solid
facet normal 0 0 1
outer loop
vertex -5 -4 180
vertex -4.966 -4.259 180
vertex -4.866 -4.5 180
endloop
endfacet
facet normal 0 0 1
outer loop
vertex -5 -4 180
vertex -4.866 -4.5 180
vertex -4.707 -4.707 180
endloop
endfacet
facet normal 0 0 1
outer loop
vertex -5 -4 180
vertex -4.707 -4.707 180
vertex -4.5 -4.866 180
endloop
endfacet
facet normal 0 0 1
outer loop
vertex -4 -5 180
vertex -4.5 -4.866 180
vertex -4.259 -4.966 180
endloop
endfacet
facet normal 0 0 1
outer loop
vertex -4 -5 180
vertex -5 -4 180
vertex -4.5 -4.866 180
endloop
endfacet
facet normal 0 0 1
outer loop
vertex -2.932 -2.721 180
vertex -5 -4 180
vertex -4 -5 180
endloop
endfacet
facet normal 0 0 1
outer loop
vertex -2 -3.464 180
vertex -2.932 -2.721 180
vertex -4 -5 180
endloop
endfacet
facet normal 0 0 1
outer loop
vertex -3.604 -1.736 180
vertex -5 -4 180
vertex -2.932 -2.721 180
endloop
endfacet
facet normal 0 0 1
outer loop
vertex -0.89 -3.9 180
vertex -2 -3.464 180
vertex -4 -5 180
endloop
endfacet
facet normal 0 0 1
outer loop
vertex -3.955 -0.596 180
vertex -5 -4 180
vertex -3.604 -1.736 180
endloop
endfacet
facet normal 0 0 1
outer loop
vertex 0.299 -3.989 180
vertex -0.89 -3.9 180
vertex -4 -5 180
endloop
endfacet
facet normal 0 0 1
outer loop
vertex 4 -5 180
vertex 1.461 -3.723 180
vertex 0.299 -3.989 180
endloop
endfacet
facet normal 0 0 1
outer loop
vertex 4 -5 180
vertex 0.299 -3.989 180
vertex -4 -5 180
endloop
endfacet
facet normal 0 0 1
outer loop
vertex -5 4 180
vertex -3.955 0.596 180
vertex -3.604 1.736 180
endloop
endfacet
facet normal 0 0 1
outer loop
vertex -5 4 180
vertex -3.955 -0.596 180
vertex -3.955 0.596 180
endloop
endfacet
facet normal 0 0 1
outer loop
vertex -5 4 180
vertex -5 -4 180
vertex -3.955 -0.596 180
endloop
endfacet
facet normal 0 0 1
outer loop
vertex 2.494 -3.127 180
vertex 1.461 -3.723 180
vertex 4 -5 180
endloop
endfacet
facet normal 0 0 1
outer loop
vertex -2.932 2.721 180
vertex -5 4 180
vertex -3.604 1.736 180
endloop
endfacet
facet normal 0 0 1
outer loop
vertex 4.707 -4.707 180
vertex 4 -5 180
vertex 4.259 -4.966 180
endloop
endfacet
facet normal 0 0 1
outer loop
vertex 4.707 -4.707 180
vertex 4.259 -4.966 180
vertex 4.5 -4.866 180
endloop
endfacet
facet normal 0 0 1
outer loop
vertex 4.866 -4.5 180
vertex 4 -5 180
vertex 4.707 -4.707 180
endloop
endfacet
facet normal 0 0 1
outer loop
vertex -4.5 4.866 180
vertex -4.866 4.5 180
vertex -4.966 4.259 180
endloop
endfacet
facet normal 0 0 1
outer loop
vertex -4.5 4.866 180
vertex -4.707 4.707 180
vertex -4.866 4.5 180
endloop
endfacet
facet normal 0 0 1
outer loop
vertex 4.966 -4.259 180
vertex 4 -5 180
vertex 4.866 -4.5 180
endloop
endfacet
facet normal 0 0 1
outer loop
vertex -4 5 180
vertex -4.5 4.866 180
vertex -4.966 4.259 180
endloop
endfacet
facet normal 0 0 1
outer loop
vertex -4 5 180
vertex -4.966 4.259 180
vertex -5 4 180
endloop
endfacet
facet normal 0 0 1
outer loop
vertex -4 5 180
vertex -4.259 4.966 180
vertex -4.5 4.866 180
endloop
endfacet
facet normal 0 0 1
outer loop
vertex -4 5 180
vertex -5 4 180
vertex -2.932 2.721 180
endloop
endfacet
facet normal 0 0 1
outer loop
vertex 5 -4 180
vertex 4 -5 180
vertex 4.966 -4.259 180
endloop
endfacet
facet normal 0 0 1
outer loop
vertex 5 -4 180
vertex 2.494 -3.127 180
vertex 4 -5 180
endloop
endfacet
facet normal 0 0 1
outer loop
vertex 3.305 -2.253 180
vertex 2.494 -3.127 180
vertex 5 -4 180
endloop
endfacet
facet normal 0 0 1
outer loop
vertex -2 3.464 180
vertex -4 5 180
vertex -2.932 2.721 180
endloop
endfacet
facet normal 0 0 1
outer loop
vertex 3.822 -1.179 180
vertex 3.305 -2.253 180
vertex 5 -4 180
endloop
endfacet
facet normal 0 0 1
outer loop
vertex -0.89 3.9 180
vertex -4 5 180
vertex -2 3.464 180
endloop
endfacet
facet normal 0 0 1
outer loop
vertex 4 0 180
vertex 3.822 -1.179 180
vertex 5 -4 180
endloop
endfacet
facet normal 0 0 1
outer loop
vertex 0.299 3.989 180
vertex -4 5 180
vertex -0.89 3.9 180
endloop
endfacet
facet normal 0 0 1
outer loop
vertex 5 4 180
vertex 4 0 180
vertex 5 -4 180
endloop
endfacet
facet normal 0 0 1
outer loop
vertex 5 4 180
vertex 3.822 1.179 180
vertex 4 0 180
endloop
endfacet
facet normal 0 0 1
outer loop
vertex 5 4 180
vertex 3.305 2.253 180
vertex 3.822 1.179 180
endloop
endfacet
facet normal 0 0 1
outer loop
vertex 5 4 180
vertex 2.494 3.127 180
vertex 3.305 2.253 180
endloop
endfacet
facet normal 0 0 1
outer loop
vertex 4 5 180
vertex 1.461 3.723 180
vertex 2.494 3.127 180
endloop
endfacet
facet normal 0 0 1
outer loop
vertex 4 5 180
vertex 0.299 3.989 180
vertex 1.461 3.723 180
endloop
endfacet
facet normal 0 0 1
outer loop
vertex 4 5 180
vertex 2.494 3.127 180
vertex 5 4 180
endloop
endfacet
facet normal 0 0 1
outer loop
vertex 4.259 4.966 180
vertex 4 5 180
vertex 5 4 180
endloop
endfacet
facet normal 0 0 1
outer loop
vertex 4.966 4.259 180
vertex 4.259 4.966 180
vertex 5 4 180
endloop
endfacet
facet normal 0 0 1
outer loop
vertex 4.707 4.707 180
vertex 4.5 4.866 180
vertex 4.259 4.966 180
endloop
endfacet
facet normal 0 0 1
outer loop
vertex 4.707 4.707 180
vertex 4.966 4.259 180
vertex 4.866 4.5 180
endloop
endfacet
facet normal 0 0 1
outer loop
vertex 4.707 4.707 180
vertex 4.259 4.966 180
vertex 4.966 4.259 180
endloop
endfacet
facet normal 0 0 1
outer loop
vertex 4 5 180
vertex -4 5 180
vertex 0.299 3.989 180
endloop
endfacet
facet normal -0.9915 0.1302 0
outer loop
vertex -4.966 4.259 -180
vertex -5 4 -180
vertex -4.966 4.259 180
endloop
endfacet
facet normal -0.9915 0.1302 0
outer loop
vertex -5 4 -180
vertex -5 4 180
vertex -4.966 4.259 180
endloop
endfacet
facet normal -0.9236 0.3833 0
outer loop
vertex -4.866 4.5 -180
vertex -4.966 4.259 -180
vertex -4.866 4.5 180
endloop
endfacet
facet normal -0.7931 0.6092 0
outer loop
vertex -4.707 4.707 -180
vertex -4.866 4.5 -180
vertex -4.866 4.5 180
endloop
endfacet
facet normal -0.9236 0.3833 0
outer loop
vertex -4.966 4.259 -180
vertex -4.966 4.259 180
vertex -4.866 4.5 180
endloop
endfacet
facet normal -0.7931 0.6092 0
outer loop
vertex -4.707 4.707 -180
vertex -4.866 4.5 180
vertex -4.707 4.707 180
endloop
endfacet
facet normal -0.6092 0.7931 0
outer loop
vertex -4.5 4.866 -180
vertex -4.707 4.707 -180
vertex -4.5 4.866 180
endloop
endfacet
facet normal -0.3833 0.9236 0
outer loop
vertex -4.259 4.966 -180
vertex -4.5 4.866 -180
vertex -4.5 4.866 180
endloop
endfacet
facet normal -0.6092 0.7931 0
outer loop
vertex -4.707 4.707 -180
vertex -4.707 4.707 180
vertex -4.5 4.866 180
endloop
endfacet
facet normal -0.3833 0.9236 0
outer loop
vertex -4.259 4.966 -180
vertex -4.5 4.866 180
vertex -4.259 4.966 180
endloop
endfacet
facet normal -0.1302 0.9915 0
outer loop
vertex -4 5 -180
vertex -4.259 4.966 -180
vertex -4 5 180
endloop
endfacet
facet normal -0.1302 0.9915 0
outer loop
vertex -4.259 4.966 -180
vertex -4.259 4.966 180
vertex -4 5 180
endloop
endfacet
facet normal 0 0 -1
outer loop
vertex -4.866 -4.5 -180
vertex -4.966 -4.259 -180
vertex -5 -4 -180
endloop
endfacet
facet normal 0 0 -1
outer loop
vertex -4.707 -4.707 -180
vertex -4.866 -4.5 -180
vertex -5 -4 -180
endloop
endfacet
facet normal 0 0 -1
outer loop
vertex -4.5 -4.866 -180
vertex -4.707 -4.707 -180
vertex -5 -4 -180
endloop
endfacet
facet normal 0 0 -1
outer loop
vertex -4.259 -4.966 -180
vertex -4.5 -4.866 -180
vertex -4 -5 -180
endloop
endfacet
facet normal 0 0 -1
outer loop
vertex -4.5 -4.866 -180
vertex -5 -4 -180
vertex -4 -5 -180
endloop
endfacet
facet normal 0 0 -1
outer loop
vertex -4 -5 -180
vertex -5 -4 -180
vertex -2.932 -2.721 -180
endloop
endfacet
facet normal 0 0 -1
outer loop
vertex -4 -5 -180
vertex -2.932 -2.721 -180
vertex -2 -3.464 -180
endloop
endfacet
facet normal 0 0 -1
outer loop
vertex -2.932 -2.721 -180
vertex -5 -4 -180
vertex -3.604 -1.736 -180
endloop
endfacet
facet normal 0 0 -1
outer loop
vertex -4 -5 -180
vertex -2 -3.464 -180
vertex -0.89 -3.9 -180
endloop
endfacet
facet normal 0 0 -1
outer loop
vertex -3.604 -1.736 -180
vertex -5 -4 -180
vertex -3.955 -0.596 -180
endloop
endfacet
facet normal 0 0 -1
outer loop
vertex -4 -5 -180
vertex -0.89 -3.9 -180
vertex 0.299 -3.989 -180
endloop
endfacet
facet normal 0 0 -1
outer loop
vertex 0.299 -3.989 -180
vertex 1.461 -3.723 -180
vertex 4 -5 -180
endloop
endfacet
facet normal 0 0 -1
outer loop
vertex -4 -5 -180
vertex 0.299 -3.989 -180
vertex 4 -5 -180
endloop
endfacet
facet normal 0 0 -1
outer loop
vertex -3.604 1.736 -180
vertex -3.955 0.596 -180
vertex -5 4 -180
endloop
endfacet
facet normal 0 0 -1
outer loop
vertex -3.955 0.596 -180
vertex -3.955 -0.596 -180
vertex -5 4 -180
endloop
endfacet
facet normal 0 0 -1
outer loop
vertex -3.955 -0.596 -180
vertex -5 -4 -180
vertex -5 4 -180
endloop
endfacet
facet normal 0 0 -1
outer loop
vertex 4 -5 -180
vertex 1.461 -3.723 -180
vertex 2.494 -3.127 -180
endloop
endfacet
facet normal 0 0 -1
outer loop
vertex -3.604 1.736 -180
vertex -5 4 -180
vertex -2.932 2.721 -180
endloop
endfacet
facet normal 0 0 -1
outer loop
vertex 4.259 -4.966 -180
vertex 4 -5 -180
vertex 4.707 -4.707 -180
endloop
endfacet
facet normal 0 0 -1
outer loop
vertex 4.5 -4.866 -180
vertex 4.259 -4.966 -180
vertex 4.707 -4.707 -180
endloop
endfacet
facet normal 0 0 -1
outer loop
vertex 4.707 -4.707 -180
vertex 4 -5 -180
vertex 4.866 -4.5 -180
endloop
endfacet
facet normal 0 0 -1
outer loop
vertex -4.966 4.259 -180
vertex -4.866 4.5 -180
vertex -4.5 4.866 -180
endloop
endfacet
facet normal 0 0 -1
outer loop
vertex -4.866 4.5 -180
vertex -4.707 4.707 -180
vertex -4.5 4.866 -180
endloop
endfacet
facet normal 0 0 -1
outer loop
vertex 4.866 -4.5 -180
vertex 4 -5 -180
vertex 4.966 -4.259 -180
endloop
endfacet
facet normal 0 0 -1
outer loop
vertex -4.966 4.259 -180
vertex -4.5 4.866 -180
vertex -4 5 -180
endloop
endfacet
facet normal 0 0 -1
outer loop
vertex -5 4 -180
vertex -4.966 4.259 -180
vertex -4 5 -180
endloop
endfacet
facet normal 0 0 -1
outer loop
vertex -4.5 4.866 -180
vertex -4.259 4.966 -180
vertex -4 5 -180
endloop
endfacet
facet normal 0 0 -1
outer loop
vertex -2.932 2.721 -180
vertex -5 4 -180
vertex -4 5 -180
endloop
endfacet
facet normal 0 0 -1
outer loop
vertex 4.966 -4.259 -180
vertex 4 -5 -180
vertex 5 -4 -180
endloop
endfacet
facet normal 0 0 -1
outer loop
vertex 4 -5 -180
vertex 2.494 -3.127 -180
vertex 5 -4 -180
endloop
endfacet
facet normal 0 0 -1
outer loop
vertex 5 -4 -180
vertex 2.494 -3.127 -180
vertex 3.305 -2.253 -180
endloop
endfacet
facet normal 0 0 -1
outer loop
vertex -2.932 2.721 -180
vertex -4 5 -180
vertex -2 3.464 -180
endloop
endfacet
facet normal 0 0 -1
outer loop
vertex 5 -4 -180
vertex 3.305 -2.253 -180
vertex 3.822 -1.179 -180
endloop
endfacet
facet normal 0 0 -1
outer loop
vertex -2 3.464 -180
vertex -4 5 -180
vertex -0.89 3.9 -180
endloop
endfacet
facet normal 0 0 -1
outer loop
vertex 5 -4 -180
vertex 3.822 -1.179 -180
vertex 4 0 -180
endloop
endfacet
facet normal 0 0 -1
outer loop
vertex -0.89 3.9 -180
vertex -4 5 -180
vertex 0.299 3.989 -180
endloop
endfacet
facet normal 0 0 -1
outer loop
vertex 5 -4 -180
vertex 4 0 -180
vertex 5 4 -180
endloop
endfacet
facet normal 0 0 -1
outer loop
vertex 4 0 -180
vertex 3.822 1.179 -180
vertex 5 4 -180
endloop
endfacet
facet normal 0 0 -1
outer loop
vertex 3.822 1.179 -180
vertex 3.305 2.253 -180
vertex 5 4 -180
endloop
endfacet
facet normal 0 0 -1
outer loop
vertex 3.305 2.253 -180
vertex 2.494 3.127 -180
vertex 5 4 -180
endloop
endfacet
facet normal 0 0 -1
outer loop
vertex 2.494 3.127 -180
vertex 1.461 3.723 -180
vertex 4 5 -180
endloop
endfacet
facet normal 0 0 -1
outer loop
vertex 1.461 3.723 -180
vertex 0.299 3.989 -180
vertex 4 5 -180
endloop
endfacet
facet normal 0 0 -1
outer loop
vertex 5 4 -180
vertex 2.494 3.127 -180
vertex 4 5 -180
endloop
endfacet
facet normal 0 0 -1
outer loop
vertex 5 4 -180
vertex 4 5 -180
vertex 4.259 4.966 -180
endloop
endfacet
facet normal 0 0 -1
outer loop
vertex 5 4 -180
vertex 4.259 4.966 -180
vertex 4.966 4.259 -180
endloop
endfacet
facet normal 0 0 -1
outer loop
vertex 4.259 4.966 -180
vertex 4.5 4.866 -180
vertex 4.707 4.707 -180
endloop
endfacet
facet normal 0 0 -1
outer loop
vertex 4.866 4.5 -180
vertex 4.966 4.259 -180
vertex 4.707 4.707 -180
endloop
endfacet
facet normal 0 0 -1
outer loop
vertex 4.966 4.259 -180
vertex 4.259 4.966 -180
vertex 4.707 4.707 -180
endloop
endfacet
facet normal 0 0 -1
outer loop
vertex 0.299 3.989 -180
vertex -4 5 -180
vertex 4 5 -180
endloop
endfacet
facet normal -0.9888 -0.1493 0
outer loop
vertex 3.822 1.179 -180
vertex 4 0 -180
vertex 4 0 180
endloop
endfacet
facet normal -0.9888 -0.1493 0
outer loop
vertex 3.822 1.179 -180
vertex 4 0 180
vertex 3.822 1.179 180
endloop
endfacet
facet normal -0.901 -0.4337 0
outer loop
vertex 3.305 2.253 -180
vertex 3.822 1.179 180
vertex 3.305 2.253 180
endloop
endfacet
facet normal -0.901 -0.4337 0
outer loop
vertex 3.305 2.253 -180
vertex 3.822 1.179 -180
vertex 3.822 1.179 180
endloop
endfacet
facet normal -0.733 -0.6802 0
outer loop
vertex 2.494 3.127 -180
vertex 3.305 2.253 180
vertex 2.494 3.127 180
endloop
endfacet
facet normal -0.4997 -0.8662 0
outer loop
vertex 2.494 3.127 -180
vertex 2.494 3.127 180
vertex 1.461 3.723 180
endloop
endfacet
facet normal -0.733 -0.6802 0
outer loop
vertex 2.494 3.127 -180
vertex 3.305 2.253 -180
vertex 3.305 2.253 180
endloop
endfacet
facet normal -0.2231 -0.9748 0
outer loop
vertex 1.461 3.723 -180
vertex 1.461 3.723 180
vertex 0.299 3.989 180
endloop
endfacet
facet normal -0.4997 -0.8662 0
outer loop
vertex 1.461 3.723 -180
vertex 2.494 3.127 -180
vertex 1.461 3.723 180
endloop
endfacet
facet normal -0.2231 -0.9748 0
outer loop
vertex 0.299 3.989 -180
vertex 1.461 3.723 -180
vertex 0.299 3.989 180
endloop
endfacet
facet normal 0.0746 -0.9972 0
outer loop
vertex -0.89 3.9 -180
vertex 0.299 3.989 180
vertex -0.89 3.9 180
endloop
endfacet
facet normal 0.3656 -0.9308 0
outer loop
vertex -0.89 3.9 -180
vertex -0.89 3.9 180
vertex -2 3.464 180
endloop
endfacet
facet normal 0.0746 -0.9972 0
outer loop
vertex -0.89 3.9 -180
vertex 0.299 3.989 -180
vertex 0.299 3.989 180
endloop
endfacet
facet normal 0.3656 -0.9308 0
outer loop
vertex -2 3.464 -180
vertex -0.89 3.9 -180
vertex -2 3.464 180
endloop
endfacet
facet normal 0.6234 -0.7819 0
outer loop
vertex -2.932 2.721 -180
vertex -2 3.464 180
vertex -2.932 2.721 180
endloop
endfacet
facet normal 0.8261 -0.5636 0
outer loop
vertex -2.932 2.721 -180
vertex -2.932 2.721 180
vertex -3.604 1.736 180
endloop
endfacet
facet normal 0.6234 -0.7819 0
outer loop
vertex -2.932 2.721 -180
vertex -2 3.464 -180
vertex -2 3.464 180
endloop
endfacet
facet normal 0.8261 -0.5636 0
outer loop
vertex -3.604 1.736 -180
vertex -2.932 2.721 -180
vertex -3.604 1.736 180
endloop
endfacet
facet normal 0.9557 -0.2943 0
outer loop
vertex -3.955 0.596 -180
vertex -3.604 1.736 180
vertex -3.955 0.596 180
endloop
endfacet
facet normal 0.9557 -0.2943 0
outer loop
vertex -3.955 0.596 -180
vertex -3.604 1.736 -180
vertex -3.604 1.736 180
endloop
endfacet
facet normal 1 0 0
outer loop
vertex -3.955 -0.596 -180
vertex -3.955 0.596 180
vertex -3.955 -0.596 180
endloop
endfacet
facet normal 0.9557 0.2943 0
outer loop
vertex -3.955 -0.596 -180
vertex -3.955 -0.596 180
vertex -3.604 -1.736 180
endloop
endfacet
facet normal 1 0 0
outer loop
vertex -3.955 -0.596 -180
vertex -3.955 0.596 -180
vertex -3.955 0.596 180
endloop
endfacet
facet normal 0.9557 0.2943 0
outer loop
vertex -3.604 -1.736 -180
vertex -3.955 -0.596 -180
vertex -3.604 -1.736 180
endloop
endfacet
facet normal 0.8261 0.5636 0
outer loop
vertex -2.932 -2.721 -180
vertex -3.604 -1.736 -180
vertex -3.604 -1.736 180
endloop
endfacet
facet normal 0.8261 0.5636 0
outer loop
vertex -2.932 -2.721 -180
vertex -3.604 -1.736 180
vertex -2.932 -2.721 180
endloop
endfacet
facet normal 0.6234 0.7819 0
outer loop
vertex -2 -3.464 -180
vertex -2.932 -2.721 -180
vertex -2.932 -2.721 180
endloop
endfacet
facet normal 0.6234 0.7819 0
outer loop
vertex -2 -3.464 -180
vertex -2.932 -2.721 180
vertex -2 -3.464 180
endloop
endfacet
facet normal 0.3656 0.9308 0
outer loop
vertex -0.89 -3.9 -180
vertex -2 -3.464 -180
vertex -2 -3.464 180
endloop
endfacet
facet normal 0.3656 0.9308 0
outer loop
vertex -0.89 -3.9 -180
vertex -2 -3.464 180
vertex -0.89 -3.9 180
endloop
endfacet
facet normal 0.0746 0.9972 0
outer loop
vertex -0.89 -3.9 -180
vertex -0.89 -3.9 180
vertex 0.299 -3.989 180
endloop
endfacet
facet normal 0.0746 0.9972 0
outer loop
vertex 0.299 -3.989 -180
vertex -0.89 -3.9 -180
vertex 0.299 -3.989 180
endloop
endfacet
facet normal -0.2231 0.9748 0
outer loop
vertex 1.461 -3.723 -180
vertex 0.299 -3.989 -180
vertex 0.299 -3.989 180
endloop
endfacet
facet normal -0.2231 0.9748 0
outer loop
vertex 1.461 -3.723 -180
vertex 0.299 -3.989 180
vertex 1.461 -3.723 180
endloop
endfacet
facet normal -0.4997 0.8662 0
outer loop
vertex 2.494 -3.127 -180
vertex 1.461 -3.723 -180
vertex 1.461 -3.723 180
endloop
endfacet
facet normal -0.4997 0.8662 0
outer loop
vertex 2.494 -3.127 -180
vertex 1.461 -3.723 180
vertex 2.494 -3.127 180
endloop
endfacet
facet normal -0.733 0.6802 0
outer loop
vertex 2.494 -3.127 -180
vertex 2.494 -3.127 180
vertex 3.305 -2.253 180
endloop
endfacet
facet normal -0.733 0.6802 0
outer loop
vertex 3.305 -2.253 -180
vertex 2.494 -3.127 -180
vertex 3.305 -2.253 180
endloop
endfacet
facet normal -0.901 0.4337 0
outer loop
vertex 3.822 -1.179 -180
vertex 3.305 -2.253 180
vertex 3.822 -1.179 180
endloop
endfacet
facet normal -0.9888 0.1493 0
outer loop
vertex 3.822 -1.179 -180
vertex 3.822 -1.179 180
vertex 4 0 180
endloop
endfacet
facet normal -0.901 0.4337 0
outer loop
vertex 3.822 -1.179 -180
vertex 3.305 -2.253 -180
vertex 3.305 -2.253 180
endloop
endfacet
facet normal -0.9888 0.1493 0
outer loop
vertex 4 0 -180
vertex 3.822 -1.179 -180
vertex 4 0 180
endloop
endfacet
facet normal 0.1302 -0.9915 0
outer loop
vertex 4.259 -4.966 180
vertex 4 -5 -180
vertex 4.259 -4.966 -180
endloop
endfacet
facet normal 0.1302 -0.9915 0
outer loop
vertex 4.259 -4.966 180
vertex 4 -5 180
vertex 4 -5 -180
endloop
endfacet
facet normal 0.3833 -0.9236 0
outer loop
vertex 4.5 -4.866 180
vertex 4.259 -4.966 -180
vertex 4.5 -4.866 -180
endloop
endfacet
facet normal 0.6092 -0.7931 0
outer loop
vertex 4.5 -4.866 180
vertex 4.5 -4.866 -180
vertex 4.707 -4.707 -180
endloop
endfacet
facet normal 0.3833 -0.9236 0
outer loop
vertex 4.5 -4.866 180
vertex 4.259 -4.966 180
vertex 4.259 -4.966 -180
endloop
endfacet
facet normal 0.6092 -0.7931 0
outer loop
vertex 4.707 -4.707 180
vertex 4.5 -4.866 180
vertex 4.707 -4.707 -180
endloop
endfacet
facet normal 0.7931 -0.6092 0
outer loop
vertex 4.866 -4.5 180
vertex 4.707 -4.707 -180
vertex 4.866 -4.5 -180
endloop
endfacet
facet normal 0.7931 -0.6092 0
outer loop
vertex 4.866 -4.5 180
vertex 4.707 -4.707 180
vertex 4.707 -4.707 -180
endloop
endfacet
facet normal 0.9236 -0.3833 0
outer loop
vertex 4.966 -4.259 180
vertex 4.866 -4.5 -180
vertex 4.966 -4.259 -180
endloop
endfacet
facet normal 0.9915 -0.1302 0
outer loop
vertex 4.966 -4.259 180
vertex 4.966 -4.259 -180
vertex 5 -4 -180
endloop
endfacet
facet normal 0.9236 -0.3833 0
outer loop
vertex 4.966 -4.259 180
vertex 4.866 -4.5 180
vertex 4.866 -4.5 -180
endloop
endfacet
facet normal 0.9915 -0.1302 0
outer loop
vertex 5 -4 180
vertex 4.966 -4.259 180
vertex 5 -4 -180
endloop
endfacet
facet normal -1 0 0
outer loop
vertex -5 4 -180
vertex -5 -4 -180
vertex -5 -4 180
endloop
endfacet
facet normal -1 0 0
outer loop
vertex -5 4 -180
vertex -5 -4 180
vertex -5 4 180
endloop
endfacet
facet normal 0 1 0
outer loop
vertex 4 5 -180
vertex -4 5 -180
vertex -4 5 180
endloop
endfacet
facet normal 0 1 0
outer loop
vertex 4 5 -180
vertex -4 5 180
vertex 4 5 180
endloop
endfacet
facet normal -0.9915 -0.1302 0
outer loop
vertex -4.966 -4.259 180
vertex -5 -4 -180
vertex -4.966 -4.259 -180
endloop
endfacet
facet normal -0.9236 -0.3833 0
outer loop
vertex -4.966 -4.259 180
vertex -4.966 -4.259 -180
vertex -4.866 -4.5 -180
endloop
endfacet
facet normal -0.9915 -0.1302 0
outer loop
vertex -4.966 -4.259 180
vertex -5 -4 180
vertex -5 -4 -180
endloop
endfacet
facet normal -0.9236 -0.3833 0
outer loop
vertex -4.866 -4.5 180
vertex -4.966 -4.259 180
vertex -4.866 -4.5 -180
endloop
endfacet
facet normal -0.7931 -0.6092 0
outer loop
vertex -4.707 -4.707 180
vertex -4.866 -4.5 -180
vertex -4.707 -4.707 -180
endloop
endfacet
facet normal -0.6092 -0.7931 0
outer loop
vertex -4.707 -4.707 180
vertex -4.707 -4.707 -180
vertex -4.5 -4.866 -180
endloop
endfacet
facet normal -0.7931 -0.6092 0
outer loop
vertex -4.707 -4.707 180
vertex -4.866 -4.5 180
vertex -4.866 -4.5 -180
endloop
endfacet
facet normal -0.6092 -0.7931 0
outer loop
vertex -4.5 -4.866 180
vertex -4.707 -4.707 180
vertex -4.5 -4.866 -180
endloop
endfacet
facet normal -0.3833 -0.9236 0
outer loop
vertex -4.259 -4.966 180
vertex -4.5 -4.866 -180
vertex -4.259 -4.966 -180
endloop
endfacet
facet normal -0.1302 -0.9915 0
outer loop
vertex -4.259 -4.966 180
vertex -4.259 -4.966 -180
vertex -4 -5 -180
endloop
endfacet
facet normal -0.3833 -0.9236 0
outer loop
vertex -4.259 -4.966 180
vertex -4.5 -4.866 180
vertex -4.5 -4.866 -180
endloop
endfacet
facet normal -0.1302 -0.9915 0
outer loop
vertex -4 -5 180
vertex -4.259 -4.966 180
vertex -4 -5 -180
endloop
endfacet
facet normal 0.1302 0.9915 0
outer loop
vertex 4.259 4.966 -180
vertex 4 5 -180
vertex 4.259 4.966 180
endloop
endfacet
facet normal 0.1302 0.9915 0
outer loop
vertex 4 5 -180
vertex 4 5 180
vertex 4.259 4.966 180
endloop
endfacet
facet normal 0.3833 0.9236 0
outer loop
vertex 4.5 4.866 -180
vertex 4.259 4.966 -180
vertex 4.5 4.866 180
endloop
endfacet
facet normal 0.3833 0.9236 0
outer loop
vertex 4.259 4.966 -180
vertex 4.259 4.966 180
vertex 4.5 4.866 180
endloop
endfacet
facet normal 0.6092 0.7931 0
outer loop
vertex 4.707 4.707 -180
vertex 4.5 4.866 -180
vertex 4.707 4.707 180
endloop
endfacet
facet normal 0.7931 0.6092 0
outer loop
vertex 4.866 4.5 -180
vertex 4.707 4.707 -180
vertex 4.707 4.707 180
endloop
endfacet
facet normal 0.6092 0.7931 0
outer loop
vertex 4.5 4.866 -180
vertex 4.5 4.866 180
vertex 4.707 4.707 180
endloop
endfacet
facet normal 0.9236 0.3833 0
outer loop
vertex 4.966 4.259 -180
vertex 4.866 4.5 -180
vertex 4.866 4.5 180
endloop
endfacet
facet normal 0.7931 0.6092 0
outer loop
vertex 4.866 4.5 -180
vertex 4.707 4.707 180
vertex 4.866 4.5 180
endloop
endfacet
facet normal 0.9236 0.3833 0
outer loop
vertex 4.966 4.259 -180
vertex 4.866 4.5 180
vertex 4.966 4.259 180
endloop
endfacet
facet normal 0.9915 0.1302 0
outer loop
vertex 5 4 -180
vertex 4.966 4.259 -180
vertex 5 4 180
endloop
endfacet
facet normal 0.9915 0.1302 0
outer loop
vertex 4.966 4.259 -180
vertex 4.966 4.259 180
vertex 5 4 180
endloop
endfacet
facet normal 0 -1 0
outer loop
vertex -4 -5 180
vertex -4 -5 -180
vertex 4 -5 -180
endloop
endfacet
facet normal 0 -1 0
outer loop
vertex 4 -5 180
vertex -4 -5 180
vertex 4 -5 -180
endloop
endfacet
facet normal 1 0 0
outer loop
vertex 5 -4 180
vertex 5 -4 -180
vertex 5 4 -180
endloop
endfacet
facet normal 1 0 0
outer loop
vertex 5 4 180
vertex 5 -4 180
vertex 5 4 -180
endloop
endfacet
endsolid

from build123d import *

# Parameters (mm, degrees)
BOSS_EXTRUDE1_DEPTH      = 180
BOSS_EXTRUDE1_DEPTH_BACK = 180
SKETCH1_W                = 10
SKETCH1_H                = 10
SKETCH1_R                = 4
FILLET1_R                = 1


with BuildPart() as part:
    # Sketch1 → Boss-Extrude1 (new, two sides: drawn at the far end of the back side and taken through both)
    with BuildSketch(Plane.XY.offset(-BOSS_EXTRUDE1_DEPTH_BACK)):
        Rectangle(SKETCH1_W, SKETCH1_H)
        Circle(SKETCH1_R, mode=Mode.SUBTRACT)
    extrude(amount=BOSS_EXTRUDE1_DEPTH + BOSS_EXTRUDE1_DEPTH_BACK)

    # Fillet1
    fillet1_edges = [part.edges().sort_by_distance(p)[0] for p in [
        (-5, 5, 0),
        (5, 5, 0),
        (5, -5, 0),
        (-5, -5, 0),
    ]]
    fillet(fillet1_edges, radius=FILLET1_R)


solid = part.part
